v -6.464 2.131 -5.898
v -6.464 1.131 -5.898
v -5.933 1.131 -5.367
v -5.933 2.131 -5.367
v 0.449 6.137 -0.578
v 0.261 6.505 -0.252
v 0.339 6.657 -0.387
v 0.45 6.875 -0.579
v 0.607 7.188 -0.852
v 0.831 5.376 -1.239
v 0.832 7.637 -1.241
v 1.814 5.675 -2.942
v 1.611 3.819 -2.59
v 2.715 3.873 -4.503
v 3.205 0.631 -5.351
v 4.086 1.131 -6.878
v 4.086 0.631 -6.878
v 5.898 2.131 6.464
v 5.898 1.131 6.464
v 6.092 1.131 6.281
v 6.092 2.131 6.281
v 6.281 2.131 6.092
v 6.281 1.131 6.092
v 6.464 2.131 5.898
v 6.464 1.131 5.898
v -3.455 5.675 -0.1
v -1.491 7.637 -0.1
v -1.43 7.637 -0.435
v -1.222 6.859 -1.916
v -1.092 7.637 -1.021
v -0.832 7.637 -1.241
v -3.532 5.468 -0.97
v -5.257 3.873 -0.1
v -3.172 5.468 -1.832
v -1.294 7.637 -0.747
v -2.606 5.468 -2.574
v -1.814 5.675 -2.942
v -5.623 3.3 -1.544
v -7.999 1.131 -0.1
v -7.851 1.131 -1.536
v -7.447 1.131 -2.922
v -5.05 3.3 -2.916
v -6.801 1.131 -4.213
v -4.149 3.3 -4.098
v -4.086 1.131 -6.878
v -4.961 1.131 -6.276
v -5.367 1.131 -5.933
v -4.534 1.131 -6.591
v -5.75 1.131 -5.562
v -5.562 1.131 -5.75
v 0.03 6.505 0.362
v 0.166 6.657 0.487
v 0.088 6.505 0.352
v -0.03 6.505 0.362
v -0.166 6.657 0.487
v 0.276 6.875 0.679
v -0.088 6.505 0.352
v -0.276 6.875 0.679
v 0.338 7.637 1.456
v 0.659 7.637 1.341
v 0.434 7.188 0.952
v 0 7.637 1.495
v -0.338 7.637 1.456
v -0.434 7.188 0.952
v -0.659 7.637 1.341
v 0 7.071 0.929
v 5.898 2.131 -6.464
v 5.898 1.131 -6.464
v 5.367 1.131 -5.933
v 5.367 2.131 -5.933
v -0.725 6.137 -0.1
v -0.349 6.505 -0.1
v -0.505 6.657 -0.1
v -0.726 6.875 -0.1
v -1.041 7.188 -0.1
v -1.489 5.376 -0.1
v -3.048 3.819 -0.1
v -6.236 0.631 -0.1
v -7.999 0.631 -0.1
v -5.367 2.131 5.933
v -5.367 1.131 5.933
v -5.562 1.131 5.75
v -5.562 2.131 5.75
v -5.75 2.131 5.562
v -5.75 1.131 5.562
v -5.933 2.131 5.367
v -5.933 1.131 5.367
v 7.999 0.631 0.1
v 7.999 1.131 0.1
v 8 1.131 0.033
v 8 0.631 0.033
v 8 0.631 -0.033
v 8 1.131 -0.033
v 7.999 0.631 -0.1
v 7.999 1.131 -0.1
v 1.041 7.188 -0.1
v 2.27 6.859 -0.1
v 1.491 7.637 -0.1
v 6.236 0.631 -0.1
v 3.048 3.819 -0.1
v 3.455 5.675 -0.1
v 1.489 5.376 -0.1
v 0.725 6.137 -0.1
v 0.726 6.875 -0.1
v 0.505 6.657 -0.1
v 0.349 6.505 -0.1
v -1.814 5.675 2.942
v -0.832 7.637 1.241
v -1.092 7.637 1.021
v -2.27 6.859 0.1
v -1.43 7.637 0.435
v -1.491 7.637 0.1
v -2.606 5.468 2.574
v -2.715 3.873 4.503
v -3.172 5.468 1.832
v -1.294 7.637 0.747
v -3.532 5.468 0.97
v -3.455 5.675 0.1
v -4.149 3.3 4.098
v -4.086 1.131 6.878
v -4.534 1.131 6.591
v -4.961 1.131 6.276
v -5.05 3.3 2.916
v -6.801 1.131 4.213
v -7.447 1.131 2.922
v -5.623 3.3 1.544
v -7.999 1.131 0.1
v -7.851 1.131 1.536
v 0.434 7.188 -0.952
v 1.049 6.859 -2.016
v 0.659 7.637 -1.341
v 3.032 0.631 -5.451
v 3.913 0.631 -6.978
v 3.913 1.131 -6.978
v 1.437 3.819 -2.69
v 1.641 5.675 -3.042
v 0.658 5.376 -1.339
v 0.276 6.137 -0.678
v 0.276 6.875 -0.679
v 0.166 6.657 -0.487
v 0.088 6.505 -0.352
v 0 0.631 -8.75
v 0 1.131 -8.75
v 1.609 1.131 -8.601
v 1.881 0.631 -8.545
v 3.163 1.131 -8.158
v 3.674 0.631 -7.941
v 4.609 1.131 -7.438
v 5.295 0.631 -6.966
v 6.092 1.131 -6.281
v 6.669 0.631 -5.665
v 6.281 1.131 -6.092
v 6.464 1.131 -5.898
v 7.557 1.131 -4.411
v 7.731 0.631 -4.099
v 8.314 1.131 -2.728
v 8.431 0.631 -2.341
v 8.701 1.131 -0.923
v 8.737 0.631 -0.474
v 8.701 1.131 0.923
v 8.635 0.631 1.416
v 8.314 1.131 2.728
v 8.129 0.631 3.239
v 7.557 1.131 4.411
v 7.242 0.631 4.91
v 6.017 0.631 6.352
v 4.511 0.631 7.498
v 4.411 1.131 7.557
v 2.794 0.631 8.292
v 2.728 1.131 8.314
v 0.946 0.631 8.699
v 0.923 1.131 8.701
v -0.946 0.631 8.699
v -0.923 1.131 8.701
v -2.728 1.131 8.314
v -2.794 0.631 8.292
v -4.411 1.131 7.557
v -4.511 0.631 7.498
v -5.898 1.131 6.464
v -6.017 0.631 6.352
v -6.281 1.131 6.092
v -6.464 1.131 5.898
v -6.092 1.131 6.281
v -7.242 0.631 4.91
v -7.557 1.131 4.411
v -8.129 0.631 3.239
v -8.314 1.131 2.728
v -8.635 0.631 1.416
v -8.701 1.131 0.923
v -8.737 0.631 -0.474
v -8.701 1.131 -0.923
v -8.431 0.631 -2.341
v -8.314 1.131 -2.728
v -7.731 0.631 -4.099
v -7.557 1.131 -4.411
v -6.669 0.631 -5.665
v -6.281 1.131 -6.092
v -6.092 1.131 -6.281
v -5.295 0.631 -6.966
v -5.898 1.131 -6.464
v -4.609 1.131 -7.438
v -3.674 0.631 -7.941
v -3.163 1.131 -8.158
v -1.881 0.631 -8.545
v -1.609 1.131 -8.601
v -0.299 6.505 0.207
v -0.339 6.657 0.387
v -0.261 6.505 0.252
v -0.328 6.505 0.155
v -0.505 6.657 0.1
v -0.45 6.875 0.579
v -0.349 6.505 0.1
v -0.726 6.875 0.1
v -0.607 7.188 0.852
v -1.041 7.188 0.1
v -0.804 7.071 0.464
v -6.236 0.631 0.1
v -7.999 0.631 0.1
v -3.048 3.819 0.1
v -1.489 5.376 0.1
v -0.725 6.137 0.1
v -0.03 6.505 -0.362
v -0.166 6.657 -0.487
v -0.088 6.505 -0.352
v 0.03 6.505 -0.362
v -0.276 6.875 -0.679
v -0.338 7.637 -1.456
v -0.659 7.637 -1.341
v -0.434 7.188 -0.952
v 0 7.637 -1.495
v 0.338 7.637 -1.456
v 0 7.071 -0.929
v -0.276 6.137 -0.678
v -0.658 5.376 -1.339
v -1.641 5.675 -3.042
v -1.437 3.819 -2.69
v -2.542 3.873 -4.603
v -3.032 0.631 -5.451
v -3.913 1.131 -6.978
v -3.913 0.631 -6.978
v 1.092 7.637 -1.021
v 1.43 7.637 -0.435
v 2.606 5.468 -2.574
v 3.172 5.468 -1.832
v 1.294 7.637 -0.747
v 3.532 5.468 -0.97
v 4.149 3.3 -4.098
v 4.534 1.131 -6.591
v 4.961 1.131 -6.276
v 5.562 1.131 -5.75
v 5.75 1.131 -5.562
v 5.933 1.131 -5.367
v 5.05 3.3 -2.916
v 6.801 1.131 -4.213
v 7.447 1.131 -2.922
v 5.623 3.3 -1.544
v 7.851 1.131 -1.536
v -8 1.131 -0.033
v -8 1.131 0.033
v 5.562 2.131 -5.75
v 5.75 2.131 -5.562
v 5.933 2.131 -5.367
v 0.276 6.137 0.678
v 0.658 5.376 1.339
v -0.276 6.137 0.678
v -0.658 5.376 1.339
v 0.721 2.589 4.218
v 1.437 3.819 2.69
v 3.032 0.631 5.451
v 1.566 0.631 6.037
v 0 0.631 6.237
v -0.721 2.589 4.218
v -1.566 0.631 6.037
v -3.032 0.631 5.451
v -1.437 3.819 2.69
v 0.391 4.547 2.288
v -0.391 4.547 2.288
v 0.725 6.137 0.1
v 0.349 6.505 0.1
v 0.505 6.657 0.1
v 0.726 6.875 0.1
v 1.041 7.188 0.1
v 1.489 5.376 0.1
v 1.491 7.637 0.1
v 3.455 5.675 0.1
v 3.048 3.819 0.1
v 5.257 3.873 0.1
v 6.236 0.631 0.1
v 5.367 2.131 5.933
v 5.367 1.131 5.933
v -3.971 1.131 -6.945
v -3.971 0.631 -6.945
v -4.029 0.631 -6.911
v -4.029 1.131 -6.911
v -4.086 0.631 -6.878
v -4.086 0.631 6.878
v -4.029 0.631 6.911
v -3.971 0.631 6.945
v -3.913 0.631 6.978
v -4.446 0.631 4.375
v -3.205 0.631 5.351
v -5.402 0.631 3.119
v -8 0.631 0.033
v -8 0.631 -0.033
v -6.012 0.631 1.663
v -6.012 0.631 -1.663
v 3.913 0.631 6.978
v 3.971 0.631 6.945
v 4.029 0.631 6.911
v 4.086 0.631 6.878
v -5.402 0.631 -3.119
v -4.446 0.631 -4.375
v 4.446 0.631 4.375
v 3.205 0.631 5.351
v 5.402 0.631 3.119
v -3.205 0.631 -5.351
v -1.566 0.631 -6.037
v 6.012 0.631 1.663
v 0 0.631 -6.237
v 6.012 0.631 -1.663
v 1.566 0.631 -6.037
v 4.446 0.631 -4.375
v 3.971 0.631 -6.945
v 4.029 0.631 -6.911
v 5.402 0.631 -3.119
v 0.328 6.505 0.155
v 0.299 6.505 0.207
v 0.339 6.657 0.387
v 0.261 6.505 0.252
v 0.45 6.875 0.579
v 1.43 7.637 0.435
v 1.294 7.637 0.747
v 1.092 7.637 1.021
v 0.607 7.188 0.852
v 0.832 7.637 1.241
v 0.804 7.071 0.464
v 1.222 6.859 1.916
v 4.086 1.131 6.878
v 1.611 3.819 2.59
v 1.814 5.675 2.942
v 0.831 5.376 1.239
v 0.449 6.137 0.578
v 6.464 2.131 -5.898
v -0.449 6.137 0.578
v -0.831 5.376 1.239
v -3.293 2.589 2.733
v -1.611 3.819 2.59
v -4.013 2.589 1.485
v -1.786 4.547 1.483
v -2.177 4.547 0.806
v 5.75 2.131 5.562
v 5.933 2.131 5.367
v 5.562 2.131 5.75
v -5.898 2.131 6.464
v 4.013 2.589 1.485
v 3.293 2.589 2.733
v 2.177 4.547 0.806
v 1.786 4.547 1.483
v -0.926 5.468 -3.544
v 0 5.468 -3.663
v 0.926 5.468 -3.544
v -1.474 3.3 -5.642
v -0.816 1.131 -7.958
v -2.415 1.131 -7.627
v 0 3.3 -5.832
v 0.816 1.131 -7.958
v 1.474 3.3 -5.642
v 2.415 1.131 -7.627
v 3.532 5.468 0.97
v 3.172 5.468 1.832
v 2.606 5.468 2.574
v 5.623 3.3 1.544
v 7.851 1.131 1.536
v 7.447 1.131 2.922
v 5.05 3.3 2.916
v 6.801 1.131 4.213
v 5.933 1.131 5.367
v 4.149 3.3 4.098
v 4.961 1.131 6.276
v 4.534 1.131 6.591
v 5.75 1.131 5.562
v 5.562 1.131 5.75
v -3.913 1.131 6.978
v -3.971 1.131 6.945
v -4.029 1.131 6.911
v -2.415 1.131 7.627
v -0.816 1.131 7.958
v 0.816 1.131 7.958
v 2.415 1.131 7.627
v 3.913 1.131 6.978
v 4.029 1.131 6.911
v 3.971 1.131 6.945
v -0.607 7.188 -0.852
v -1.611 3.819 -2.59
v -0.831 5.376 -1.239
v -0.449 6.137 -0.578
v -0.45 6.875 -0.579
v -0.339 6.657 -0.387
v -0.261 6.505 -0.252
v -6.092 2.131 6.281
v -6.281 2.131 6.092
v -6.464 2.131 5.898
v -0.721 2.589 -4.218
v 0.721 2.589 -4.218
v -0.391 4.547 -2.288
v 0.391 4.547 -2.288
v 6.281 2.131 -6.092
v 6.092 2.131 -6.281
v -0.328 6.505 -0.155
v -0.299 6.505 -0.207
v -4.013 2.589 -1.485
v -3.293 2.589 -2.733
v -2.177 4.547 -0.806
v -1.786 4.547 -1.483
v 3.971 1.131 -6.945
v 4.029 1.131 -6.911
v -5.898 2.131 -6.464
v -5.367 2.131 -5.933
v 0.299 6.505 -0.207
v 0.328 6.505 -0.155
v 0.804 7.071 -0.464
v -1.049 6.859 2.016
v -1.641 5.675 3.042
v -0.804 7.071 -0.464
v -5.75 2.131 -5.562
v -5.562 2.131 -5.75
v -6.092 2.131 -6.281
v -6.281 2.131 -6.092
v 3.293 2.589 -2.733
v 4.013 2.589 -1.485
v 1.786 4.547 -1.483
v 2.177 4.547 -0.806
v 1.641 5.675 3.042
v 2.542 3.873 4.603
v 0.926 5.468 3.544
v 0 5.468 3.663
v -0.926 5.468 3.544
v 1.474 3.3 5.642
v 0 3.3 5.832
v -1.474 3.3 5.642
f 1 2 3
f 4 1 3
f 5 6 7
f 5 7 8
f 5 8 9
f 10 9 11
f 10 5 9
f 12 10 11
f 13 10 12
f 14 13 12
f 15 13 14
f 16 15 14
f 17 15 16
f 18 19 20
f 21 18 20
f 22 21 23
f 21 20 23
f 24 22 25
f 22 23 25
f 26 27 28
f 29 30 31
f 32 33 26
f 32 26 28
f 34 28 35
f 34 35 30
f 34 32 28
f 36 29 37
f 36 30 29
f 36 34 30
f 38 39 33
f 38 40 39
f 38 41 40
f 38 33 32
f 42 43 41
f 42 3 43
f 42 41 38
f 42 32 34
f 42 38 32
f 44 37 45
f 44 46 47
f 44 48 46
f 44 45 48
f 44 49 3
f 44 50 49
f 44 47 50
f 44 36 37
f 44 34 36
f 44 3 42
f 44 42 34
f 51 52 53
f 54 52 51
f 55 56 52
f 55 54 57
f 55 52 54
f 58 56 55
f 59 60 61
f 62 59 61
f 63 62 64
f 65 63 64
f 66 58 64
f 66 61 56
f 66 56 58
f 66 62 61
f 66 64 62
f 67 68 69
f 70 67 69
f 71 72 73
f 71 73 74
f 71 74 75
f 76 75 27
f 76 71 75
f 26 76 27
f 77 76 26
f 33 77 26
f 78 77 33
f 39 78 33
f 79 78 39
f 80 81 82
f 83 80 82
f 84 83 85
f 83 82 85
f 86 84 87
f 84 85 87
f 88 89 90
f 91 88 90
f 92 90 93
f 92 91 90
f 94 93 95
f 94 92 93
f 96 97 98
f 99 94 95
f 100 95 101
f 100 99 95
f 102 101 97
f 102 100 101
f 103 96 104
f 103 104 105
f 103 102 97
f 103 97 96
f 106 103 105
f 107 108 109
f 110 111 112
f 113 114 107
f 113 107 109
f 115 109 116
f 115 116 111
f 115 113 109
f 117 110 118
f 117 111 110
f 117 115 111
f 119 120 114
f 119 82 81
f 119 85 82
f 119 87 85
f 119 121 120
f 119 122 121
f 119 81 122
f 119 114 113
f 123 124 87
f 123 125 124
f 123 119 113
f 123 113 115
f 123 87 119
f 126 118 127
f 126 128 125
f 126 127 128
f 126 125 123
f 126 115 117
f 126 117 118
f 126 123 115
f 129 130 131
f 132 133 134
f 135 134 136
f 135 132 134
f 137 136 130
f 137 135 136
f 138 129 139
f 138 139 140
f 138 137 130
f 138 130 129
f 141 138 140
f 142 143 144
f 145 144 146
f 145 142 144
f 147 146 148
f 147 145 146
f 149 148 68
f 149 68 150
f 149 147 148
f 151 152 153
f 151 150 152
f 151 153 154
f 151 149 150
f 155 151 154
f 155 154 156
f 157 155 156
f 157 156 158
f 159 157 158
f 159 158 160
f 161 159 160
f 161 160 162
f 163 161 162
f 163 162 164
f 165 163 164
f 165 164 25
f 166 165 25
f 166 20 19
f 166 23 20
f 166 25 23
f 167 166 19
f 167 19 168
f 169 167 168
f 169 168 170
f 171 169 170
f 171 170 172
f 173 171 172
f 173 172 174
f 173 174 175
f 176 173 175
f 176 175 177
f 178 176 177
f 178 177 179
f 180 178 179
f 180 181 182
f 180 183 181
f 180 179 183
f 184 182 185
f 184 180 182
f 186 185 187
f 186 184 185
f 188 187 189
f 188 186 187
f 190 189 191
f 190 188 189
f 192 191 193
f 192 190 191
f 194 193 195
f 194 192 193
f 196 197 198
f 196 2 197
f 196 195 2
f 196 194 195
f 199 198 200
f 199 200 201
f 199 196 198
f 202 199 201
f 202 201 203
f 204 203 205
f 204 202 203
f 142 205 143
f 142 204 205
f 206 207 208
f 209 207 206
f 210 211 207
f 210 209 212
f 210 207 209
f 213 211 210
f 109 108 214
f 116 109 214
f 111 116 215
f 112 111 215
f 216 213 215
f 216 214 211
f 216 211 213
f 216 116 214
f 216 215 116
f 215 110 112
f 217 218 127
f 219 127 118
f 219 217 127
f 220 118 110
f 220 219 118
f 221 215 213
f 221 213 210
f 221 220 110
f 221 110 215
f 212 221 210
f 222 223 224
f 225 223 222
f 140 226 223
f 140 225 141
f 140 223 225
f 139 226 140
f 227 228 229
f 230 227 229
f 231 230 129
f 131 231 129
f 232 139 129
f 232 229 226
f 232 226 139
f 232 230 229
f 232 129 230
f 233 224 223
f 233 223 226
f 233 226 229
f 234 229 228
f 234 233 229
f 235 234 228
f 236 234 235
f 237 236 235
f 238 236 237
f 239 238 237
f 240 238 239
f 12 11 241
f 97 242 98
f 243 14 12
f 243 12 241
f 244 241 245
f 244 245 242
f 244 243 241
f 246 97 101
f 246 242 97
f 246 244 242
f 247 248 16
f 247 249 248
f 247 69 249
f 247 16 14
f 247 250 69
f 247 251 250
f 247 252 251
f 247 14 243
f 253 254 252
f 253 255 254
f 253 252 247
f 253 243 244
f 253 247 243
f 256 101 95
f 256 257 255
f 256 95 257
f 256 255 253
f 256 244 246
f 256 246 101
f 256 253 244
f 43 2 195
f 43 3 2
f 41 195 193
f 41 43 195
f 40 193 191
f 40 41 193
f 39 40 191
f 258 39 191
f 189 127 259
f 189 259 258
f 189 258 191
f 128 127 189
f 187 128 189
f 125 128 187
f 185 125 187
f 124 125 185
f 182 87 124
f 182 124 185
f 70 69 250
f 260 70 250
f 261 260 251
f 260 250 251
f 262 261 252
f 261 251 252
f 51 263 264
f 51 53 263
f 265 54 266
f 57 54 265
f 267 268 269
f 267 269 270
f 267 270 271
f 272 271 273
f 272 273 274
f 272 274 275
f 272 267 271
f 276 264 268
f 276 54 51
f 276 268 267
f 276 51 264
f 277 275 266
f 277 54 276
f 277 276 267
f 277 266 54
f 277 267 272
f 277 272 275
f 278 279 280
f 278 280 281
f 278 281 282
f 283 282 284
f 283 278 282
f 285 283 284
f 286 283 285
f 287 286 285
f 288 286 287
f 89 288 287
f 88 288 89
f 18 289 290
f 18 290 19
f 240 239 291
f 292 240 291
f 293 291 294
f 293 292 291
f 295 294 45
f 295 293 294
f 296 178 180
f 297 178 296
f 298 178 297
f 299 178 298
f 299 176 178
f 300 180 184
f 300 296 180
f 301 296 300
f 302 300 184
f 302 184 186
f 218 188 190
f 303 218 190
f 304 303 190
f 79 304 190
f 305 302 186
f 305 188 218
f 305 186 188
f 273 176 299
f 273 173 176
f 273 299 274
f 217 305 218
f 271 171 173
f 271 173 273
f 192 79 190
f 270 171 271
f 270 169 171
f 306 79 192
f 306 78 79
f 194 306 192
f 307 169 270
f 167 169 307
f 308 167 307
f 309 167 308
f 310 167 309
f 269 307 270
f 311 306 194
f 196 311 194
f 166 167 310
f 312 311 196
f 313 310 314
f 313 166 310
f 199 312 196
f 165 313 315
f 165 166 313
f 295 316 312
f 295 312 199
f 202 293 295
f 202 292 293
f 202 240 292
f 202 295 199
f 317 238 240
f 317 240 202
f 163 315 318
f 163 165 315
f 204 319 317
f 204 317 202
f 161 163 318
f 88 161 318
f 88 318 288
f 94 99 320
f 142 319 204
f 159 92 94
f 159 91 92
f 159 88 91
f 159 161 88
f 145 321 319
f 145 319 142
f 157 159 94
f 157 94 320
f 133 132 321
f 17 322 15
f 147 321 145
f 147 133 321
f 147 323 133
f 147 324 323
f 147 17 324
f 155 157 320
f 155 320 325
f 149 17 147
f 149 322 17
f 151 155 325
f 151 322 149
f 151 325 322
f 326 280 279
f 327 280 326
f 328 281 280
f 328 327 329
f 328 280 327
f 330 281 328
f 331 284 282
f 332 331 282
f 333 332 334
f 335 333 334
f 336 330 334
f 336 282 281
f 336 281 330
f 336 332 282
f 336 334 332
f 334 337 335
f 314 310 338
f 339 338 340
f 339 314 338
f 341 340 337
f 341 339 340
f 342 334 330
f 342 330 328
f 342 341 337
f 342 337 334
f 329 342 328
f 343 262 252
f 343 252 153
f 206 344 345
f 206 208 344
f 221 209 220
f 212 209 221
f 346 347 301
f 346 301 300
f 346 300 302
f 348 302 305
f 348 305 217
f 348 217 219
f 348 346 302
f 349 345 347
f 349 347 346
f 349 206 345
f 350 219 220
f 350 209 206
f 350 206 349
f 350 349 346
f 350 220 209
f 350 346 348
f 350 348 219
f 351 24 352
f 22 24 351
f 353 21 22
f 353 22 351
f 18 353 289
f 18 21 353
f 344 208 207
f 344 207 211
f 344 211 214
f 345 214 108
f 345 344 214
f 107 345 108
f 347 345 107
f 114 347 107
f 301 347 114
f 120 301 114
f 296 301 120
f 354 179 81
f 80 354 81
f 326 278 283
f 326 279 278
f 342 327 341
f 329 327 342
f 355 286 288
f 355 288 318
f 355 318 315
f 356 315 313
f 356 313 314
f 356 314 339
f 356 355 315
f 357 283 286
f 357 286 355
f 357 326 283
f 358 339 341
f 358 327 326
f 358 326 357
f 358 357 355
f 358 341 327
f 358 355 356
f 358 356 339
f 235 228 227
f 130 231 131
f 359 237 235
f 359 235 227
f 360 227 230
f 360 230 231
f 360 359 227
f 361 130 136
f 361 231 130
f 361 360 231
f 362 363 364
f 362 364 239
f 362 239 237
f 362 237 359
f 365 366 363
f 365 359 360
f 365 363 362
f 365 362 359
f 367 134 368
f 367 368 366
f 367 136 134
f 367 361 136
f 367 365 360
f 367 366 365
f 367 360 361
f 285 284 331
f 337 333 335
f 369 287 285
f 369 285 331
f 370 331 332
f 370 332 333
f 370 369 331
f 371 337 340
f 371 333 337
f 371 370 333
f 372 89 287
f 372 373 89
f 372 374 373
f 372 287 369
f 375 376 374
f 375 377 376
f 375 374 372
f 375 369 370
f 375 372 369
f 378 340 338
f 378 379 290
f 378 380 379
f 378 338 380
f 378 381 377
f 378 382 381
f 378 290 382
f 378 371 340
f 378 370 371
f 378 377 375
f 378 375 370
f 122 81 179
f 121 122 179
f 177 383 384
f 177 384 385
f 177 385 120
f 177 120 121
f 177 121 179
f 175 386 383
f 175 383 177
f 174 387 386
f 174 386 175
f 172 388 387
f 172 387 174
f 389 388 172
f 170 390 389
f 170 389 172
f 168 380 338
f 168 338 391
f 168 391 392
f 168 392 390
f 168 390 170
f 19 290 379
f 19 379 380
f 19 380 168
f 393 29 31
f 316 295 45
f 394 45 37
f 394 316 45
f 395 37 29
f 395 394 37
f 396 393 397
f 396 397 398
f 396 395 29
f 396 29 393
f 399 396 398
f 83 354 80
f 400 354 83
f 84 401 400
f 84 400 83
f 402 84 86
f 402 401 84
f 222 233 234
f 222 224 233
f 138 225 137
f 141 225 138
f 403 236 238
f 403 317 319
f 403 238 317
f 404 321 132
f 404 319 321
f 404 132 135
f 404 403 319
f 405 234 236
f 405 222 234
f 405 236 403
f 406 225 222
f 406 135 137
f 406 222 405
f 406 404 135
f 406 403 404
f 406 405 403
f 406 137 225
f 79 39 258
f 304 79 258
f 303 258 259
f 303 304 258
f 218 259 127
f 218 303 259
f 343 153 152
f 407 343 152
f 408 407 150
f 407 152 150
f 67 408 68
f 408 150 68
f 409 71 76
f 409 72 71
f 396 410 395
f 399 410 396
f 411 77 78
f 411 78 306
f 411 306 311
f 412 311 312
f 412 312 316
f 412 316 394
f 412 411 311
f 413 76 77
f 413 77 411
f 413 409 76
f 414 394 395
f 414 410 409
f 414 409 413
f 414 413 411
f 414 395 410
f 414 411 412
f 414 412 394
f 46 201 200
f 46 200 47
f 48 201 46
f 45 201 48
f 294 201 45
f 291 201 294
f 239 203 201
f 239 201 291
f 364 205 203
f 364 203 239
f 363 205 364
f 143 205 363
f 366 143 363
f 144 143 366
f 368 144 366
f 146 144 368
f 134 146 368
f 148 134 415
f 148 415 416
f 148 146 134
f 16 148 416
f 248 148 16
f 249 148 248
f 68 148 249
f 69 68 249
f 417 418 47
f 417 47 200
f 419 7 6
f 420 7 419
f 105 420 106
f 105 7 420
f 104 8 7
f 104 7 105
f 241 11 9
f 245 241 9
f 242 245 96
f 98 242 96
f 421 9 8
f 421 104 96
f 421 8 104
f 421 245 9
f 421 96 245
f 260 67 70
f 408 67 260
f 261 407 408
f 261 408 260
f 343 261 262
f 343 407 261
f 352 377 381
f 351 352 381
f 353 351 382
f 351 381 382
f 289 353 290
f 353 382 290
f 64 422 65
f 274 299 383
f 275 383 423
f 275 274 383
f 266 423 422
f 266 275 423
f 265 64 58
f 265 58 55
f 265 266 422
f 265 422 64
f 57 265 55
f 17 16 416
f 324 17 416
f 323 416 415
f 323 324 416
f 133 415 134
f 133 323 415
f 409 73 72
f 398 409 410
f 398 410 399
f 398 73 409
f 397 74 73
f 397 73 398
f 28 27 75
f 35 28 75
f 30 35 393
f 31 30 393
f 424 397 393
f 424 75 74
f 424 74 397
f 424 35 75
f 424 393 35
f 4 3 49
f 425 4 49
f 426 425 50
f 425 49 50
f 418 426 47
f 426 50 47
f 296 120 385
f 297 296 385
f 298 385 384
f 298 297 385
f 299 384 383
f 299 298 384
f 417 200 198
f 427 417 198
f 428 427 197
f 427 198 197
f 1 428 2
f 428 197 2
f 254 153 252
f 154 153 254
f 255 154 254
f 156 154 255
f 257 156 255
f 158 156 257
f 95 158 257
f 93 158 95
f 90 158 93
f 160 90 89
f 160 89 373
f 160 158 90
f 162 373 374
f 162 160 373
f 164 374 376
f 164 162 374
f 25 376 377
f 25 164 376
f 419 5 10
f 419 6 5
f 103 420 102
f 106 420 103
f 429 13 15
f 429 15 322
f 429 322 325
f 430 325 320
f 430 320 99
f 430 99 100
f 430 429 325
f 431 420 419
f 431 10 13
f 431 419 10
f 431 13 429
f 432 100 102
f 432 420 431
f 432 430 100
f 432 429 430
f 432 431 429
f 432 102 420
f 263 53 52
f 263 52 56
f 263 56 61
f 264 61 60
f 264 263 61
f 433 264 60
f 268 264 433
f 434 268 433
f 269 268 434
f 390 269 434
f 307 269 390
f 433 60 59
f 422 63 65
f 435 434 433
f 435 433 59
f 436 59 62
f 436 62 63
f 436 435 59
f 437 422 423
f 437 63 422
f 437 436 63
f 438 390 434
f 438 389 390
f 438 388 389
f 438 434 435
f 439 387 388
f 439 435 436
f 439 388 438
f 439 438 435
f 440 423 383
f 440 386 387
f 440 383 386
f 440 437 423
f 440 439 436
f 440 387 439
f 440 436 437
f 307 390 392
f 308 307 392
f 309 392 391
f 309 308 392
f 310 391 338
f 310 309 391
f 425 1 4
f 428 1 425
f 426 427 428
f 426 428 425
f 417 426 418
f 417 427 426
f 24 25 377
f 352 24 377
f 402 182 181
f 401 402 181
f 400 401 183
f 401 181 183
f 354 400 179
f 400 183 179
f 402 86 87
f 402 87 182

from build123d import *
from build123d.topology import SkipClean

# Parameters (mm, degrees)
CUT_EXTRUDE_1_REACH             = 16.541
CUT_EXTRUDE_1_DIRECTION_2_DEPTH = 10
PATTERN_CIRCULAR_1_COUNT        = 6
EXTRUDE_1_DEPTH                 = 1
PATTERN_CIRCULAR_2_COUNT        = 4


with BuildPart() as part:
    # 草图1 → 旋转2 (revolve)
    with BuildSketch(Plane.XY):
        Polygon((-1.494617613, 7.636753237), (-8, 1.13137085), (-8.75, 1.13137085), (-8.75, 0.63137085), (-6.2372583, 0.63137085), (-0.363246763, 6.505382387), align=None)
    revolve(axis=Axis((0, 35.786073675, 0), (0, -1, 0)))

    # 草图2 → 切除-拉伸1 (cut, up to next)
    with BuildSketch(Plane(origin=(0, 0, 0), x_dir=(1, 0, 0), z_dir=(0, 1, 0)), mode=Mode.PRIVATE) as cut_extrude_1_sk1:
        with BuildLine():
            Line((0, -0.1), (7.999374976, -0.1))
            ThreePointArc((7.999374976, -0.1), (8, 0), (7.999374976, 0.1))
            Line((7.999374976, 0.1), (0, 0.1))
            Line((0, 0.1), (0, -0.1))
        make_face()
    cut_extrude_1_tool1 = extrude(cut_extrude_1_sk1.sketch, amount=CUT_EXTRUDE_1_REACH, mode=Mode.PRIVATE) & part.part
    cut_extrude_1 = cut_extrude_1_tool1.solids().sort_by_distance((3.999896, 0, 0))[0]
    add(cut_extrude_1, mode=Mode.SUBTRACT)

    # 草图2 → 切除-拉伸1 direction 2 (cut)
    with BuildSketch(Plane(origin=(0, 0, 0), x_dir=(1, 0, 0), z_dir=(0, 1, 0))):
        with BuildLine():
            Line((0, -0.1), (7.999374976, -0.1))
            ThreePointArc((7.999374976, -0.1), (8, 0), (7.999374976, 0.1))
            Line((7.999374976, 0.1), (0, 0.1))
            Line((0, 0.1), (0, -0.1))
        make_face()
    cut_extrude_1_direction_2 = extrude(amount=-CUT_EXTRUDE_1_DIRECTION_2_DEPTH, mode=Mode.SUBTRACT)

    # 阵列(圆周)1: 切除-拉伸1, 切除-拉伸1 direction 2 ×6 about axis
    pattern_circular_1_axis = Axis((0, 1.13137085, 0), (0, 1, 0))
    add([cut_extrude_1.rotate(pattern_circular_1_axis, i * 360 / PATTERN_CIRCULAR_1_COUNT) for i in range(1, PATTERN_CIRCULAR_1_COUNT)], mode=Mode.SUBTRACT)
    add([cut_extrude_1_direction_2.rotate(pattern_circular_1_axis, i * 360 / PATTERN_CIRCULAR_1_COUNT) for i in range(1, PATTERN_CIRCULAR_1_COUNT)], mode=Mode.SUBTRACT)

    # 草图3 → 凸台-拉伸1 (add)
    with BuildSketch(Plane(origin=(0, 1.13137085, 0), x_dir=(1, 0, 0), z_dir=(0, 1, 0))):
        with BuildLine():
            Line((-5.366936044, 5.932621469), (-5.897873265, 6.46355869))
            ThreePointArc((-5.897873265, 6.46355869), (-6.187184335, 6.187184335), (-6.46355869, 5.897873265))
            Line((-6.46355869, 5.897873265), (-5.932621469, 5.366936044))
            ThreePointArc((-5.932621469, 5.366936044), (-5.656854249, 5.656854249), (-5.366936044, 5.932621469))
        make_face()
    extrude_1 = extrude(amount=EXTRUDE_1_DEPTH)

    # 阵列(圆周)2: 凸台-拉伸1 ×4 about axis
    with SkipClean():  # the faces are left unmerged after this step: merging them gives an invalid solid
        pattern_circular_2_axis = Axis((0, 1.13137085, 0), (0, 1, 0))
        for i in range(1, PATTERN_CIRCULAR_2_COUNT):
            add(extrude_1.rotate(pattern_circular_2_axis, i * 360 / PATTERN_CIRCULAR_2_COUNT))


solid = part.part
